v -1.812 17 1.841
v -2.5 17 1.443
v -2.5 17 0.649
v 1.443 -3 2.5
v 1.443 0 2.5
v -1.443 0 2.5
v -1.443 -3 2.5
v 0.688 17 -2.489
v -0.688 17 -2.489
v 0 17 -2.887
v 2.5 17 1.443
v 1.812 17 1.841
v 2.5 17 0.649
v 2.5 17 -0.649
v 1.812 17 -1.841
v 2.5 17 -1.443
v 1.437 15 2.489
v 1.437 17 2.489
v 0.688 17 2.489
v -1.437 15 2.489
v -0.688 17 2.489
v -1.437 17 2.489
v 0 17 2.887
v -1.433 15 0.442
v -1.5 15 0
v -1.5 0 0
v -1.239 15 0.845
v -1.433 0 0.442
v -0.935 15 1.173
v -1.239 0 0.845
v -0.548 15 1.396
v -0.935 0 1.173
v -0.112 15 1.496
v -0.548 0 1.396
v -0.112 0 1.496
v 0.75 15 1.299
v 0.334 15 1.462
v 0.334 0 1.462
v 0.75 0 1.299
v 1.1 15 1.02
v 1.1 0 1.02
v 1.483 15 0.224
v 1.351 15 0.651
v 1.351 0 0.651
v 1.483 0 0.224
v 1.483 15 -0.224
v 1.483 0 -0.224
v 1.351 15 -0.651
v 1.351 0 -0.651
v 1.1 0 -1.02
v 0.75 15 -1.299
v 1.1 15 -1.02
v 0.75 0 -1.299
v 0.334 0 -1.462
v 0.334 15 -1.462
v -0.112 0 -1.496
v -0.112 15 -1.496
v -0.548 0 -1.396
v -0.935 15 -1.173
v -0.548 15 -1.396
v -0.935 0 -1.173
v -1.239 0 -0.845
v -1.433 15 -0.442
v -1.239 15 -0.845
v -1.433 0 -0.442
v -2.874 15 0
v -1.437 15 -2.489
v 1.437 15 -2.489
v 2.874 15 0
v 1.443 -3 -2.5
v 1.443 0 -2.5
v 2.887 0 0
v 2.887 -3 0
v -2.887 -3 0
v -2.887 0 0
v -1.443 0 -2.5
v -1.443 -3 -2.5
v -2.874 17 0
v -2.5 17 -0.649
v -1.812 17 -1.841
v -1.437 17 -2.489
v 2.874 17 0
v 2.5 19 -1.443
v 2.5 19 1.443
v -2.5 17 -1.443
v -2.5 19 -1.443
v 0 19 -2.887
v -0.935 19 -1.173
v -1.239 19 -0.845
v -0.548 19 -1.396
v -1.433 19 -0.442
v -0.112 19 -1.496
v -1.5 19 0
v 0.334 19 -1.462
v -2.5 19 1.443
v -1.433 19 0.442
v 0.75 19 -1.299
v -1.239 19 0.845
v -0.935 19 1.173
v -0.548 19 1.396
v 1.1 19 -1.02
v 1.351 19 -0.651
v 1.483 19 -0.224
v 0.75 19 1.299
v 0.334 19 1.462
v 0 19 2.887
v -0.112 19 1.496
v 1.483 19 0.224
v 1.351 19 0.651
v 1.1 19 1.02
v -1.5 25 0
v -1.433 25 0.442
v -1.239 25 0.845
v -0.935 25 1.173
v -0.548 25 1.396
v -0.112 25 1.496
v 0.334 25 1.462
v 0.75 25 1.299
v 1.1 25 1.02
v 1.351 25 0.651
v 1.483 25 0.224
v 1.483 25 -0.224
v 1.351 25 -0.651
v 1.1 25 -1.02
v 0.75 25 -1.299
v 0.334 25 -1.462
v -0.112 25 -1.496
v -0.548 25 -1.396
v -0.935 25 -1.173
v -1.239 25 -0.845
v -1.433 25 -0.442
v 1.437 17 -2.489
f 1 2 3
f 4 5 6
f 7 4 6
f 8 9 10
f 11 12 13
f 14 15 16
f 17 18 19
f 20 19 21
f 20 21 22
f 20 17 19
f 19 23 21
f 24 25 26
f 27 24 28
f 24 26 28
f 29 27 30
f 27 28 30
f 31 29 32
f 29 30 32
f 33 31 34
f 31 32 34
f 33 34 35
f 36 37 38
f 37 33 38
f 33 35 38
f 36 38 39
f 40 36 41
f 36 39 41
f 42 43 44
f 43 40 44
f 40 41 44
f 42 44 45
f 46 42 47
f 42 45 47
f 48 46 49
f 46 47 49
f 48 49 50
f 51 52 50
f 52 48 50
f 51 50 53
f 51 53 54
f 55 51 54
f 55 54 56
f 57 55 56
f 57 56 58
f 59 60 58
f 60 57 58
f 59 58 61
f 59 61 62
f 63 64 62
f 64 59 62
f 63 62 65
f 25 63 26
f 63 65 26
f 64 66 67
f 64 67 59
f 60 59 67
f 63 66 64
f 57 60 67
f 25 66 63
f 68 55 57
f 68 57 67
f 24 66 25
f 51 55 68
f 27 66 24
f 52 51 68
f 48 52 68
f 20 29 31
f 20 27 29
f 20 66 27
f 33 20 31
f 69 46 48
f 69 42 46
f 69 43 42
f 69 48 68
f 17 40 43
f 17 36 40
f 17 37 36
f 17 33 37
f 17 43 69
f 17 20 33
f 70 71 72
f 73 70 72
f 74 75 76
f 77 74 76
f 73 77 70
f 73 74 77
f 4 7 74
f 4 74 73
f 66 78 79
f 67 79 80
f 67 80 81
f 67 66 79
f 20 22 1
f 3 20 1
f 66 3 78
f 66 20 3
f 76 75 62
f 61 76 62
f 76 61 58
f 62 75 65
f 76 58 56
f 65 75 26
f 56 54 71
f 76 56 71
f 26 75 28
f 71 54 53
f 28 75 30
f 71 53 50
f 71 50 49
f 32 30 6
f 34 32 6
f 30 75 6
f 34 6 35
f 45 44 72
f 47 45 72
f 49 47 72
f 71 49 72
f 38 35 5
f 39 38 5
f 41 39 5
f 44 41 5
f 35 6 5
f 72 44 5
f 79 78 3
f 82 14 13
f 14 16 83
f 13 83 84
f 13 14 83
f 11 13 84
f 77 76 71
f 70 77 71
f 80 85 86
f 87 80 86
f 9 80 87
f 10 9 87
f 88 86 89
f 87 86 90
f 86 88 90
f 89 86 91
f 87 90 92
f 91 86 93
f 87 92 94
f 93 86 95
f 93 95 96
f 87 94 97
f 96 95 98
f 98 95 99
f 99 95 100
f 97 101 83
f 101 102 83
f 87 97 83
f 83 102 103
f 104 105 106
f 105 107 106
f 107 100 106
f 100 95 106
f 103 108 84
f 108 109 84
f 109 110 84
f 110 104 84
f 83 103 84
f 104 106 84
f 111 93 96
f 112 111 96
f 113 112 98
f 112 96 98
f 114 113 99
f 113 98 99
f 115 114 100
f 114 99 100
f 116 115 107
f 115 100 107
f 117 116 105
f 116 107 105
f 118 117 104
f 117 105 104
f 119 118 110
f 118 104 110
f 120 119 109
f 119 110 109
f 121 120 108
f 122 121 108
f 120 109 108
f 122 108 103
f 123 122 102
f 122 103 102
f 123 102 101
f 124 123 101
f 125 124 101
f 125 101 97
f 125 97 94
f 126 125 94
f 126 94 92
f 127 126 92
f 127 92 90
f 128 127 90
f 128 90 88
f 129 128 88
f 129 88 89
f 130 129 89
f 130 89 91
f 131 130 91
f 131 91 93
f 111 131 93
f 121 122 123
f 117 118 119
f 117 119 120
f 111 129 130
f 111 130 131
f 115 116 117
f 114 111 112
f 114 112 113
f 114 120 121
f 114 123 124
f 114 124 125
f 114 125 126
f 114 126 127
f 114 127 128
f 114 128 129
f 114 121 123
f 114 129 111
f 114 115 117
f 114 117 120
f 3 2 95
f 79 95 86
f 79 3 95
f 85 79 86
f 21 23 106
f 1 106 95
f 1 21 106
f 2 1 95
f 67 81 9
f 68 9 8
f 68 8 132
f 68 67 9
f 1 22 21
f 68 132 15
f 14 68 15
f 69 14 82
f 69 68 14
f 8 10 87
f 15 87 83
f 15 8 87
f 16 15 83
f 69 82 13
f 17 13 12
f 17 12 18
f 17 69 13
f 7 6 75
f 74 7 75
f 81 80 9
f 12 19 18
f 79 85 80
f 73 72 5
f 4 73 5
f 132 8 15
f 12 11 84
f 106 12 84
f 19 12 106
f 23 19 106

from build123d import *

# Parameters (mm, degrees)
F1_DEPTH = 3
F2_R     = 1.5
F3_DEPTH = 25
F6_DEPTH = 2
F9_DEPTH = 2


with BuildPart() as f1:
    # F0 (on Front) → F1 (new body)
    with BuildSketch(Plane.XZ):
        Polygon((-1.443376, -2.5), (1.443376, -2.5), (2.886751, 0), (1.443376, 2.5), (-1.443376, 2.5), (-2.886751, 0), align=None)
    extrude(amount=F1_DEPTH)

    # F2 (on face) → F3 (join)
    with BuildSketch(Plane(origin=(0, 0, 0), x_dir=(-1, 0, 0), z_dir=(0, 1, 0))):
        Circle(F2_R)
    extrude(amount=F3_DEPTH)

    # F5 (on offset) → F6 (join)
    with BuildSketch(Plane.XZ.offset(-15)):
        Polygon((1.437224, 2.489345), (-1.437224, 2.489345), (-2.874448, 0), (-1.437224, -2.489345), (1.437224, -2.489345), (2.874448, 0), align=None)
    extrude(amount=-F6_DEPTH)

    # F8 (on offset) → F9 (join)
    with BuildSketch(Plane.XZ.offset(-17)):
        Polygon((2.5, -1.443376), (2.5, 1.443376), (0, 2.886751), (-2.5, 1.443376), (-2.5, -1.443376), (0, -2.886751), align=None)
    extrude(amount=-F9_DEPTH)


solid = f1.part
